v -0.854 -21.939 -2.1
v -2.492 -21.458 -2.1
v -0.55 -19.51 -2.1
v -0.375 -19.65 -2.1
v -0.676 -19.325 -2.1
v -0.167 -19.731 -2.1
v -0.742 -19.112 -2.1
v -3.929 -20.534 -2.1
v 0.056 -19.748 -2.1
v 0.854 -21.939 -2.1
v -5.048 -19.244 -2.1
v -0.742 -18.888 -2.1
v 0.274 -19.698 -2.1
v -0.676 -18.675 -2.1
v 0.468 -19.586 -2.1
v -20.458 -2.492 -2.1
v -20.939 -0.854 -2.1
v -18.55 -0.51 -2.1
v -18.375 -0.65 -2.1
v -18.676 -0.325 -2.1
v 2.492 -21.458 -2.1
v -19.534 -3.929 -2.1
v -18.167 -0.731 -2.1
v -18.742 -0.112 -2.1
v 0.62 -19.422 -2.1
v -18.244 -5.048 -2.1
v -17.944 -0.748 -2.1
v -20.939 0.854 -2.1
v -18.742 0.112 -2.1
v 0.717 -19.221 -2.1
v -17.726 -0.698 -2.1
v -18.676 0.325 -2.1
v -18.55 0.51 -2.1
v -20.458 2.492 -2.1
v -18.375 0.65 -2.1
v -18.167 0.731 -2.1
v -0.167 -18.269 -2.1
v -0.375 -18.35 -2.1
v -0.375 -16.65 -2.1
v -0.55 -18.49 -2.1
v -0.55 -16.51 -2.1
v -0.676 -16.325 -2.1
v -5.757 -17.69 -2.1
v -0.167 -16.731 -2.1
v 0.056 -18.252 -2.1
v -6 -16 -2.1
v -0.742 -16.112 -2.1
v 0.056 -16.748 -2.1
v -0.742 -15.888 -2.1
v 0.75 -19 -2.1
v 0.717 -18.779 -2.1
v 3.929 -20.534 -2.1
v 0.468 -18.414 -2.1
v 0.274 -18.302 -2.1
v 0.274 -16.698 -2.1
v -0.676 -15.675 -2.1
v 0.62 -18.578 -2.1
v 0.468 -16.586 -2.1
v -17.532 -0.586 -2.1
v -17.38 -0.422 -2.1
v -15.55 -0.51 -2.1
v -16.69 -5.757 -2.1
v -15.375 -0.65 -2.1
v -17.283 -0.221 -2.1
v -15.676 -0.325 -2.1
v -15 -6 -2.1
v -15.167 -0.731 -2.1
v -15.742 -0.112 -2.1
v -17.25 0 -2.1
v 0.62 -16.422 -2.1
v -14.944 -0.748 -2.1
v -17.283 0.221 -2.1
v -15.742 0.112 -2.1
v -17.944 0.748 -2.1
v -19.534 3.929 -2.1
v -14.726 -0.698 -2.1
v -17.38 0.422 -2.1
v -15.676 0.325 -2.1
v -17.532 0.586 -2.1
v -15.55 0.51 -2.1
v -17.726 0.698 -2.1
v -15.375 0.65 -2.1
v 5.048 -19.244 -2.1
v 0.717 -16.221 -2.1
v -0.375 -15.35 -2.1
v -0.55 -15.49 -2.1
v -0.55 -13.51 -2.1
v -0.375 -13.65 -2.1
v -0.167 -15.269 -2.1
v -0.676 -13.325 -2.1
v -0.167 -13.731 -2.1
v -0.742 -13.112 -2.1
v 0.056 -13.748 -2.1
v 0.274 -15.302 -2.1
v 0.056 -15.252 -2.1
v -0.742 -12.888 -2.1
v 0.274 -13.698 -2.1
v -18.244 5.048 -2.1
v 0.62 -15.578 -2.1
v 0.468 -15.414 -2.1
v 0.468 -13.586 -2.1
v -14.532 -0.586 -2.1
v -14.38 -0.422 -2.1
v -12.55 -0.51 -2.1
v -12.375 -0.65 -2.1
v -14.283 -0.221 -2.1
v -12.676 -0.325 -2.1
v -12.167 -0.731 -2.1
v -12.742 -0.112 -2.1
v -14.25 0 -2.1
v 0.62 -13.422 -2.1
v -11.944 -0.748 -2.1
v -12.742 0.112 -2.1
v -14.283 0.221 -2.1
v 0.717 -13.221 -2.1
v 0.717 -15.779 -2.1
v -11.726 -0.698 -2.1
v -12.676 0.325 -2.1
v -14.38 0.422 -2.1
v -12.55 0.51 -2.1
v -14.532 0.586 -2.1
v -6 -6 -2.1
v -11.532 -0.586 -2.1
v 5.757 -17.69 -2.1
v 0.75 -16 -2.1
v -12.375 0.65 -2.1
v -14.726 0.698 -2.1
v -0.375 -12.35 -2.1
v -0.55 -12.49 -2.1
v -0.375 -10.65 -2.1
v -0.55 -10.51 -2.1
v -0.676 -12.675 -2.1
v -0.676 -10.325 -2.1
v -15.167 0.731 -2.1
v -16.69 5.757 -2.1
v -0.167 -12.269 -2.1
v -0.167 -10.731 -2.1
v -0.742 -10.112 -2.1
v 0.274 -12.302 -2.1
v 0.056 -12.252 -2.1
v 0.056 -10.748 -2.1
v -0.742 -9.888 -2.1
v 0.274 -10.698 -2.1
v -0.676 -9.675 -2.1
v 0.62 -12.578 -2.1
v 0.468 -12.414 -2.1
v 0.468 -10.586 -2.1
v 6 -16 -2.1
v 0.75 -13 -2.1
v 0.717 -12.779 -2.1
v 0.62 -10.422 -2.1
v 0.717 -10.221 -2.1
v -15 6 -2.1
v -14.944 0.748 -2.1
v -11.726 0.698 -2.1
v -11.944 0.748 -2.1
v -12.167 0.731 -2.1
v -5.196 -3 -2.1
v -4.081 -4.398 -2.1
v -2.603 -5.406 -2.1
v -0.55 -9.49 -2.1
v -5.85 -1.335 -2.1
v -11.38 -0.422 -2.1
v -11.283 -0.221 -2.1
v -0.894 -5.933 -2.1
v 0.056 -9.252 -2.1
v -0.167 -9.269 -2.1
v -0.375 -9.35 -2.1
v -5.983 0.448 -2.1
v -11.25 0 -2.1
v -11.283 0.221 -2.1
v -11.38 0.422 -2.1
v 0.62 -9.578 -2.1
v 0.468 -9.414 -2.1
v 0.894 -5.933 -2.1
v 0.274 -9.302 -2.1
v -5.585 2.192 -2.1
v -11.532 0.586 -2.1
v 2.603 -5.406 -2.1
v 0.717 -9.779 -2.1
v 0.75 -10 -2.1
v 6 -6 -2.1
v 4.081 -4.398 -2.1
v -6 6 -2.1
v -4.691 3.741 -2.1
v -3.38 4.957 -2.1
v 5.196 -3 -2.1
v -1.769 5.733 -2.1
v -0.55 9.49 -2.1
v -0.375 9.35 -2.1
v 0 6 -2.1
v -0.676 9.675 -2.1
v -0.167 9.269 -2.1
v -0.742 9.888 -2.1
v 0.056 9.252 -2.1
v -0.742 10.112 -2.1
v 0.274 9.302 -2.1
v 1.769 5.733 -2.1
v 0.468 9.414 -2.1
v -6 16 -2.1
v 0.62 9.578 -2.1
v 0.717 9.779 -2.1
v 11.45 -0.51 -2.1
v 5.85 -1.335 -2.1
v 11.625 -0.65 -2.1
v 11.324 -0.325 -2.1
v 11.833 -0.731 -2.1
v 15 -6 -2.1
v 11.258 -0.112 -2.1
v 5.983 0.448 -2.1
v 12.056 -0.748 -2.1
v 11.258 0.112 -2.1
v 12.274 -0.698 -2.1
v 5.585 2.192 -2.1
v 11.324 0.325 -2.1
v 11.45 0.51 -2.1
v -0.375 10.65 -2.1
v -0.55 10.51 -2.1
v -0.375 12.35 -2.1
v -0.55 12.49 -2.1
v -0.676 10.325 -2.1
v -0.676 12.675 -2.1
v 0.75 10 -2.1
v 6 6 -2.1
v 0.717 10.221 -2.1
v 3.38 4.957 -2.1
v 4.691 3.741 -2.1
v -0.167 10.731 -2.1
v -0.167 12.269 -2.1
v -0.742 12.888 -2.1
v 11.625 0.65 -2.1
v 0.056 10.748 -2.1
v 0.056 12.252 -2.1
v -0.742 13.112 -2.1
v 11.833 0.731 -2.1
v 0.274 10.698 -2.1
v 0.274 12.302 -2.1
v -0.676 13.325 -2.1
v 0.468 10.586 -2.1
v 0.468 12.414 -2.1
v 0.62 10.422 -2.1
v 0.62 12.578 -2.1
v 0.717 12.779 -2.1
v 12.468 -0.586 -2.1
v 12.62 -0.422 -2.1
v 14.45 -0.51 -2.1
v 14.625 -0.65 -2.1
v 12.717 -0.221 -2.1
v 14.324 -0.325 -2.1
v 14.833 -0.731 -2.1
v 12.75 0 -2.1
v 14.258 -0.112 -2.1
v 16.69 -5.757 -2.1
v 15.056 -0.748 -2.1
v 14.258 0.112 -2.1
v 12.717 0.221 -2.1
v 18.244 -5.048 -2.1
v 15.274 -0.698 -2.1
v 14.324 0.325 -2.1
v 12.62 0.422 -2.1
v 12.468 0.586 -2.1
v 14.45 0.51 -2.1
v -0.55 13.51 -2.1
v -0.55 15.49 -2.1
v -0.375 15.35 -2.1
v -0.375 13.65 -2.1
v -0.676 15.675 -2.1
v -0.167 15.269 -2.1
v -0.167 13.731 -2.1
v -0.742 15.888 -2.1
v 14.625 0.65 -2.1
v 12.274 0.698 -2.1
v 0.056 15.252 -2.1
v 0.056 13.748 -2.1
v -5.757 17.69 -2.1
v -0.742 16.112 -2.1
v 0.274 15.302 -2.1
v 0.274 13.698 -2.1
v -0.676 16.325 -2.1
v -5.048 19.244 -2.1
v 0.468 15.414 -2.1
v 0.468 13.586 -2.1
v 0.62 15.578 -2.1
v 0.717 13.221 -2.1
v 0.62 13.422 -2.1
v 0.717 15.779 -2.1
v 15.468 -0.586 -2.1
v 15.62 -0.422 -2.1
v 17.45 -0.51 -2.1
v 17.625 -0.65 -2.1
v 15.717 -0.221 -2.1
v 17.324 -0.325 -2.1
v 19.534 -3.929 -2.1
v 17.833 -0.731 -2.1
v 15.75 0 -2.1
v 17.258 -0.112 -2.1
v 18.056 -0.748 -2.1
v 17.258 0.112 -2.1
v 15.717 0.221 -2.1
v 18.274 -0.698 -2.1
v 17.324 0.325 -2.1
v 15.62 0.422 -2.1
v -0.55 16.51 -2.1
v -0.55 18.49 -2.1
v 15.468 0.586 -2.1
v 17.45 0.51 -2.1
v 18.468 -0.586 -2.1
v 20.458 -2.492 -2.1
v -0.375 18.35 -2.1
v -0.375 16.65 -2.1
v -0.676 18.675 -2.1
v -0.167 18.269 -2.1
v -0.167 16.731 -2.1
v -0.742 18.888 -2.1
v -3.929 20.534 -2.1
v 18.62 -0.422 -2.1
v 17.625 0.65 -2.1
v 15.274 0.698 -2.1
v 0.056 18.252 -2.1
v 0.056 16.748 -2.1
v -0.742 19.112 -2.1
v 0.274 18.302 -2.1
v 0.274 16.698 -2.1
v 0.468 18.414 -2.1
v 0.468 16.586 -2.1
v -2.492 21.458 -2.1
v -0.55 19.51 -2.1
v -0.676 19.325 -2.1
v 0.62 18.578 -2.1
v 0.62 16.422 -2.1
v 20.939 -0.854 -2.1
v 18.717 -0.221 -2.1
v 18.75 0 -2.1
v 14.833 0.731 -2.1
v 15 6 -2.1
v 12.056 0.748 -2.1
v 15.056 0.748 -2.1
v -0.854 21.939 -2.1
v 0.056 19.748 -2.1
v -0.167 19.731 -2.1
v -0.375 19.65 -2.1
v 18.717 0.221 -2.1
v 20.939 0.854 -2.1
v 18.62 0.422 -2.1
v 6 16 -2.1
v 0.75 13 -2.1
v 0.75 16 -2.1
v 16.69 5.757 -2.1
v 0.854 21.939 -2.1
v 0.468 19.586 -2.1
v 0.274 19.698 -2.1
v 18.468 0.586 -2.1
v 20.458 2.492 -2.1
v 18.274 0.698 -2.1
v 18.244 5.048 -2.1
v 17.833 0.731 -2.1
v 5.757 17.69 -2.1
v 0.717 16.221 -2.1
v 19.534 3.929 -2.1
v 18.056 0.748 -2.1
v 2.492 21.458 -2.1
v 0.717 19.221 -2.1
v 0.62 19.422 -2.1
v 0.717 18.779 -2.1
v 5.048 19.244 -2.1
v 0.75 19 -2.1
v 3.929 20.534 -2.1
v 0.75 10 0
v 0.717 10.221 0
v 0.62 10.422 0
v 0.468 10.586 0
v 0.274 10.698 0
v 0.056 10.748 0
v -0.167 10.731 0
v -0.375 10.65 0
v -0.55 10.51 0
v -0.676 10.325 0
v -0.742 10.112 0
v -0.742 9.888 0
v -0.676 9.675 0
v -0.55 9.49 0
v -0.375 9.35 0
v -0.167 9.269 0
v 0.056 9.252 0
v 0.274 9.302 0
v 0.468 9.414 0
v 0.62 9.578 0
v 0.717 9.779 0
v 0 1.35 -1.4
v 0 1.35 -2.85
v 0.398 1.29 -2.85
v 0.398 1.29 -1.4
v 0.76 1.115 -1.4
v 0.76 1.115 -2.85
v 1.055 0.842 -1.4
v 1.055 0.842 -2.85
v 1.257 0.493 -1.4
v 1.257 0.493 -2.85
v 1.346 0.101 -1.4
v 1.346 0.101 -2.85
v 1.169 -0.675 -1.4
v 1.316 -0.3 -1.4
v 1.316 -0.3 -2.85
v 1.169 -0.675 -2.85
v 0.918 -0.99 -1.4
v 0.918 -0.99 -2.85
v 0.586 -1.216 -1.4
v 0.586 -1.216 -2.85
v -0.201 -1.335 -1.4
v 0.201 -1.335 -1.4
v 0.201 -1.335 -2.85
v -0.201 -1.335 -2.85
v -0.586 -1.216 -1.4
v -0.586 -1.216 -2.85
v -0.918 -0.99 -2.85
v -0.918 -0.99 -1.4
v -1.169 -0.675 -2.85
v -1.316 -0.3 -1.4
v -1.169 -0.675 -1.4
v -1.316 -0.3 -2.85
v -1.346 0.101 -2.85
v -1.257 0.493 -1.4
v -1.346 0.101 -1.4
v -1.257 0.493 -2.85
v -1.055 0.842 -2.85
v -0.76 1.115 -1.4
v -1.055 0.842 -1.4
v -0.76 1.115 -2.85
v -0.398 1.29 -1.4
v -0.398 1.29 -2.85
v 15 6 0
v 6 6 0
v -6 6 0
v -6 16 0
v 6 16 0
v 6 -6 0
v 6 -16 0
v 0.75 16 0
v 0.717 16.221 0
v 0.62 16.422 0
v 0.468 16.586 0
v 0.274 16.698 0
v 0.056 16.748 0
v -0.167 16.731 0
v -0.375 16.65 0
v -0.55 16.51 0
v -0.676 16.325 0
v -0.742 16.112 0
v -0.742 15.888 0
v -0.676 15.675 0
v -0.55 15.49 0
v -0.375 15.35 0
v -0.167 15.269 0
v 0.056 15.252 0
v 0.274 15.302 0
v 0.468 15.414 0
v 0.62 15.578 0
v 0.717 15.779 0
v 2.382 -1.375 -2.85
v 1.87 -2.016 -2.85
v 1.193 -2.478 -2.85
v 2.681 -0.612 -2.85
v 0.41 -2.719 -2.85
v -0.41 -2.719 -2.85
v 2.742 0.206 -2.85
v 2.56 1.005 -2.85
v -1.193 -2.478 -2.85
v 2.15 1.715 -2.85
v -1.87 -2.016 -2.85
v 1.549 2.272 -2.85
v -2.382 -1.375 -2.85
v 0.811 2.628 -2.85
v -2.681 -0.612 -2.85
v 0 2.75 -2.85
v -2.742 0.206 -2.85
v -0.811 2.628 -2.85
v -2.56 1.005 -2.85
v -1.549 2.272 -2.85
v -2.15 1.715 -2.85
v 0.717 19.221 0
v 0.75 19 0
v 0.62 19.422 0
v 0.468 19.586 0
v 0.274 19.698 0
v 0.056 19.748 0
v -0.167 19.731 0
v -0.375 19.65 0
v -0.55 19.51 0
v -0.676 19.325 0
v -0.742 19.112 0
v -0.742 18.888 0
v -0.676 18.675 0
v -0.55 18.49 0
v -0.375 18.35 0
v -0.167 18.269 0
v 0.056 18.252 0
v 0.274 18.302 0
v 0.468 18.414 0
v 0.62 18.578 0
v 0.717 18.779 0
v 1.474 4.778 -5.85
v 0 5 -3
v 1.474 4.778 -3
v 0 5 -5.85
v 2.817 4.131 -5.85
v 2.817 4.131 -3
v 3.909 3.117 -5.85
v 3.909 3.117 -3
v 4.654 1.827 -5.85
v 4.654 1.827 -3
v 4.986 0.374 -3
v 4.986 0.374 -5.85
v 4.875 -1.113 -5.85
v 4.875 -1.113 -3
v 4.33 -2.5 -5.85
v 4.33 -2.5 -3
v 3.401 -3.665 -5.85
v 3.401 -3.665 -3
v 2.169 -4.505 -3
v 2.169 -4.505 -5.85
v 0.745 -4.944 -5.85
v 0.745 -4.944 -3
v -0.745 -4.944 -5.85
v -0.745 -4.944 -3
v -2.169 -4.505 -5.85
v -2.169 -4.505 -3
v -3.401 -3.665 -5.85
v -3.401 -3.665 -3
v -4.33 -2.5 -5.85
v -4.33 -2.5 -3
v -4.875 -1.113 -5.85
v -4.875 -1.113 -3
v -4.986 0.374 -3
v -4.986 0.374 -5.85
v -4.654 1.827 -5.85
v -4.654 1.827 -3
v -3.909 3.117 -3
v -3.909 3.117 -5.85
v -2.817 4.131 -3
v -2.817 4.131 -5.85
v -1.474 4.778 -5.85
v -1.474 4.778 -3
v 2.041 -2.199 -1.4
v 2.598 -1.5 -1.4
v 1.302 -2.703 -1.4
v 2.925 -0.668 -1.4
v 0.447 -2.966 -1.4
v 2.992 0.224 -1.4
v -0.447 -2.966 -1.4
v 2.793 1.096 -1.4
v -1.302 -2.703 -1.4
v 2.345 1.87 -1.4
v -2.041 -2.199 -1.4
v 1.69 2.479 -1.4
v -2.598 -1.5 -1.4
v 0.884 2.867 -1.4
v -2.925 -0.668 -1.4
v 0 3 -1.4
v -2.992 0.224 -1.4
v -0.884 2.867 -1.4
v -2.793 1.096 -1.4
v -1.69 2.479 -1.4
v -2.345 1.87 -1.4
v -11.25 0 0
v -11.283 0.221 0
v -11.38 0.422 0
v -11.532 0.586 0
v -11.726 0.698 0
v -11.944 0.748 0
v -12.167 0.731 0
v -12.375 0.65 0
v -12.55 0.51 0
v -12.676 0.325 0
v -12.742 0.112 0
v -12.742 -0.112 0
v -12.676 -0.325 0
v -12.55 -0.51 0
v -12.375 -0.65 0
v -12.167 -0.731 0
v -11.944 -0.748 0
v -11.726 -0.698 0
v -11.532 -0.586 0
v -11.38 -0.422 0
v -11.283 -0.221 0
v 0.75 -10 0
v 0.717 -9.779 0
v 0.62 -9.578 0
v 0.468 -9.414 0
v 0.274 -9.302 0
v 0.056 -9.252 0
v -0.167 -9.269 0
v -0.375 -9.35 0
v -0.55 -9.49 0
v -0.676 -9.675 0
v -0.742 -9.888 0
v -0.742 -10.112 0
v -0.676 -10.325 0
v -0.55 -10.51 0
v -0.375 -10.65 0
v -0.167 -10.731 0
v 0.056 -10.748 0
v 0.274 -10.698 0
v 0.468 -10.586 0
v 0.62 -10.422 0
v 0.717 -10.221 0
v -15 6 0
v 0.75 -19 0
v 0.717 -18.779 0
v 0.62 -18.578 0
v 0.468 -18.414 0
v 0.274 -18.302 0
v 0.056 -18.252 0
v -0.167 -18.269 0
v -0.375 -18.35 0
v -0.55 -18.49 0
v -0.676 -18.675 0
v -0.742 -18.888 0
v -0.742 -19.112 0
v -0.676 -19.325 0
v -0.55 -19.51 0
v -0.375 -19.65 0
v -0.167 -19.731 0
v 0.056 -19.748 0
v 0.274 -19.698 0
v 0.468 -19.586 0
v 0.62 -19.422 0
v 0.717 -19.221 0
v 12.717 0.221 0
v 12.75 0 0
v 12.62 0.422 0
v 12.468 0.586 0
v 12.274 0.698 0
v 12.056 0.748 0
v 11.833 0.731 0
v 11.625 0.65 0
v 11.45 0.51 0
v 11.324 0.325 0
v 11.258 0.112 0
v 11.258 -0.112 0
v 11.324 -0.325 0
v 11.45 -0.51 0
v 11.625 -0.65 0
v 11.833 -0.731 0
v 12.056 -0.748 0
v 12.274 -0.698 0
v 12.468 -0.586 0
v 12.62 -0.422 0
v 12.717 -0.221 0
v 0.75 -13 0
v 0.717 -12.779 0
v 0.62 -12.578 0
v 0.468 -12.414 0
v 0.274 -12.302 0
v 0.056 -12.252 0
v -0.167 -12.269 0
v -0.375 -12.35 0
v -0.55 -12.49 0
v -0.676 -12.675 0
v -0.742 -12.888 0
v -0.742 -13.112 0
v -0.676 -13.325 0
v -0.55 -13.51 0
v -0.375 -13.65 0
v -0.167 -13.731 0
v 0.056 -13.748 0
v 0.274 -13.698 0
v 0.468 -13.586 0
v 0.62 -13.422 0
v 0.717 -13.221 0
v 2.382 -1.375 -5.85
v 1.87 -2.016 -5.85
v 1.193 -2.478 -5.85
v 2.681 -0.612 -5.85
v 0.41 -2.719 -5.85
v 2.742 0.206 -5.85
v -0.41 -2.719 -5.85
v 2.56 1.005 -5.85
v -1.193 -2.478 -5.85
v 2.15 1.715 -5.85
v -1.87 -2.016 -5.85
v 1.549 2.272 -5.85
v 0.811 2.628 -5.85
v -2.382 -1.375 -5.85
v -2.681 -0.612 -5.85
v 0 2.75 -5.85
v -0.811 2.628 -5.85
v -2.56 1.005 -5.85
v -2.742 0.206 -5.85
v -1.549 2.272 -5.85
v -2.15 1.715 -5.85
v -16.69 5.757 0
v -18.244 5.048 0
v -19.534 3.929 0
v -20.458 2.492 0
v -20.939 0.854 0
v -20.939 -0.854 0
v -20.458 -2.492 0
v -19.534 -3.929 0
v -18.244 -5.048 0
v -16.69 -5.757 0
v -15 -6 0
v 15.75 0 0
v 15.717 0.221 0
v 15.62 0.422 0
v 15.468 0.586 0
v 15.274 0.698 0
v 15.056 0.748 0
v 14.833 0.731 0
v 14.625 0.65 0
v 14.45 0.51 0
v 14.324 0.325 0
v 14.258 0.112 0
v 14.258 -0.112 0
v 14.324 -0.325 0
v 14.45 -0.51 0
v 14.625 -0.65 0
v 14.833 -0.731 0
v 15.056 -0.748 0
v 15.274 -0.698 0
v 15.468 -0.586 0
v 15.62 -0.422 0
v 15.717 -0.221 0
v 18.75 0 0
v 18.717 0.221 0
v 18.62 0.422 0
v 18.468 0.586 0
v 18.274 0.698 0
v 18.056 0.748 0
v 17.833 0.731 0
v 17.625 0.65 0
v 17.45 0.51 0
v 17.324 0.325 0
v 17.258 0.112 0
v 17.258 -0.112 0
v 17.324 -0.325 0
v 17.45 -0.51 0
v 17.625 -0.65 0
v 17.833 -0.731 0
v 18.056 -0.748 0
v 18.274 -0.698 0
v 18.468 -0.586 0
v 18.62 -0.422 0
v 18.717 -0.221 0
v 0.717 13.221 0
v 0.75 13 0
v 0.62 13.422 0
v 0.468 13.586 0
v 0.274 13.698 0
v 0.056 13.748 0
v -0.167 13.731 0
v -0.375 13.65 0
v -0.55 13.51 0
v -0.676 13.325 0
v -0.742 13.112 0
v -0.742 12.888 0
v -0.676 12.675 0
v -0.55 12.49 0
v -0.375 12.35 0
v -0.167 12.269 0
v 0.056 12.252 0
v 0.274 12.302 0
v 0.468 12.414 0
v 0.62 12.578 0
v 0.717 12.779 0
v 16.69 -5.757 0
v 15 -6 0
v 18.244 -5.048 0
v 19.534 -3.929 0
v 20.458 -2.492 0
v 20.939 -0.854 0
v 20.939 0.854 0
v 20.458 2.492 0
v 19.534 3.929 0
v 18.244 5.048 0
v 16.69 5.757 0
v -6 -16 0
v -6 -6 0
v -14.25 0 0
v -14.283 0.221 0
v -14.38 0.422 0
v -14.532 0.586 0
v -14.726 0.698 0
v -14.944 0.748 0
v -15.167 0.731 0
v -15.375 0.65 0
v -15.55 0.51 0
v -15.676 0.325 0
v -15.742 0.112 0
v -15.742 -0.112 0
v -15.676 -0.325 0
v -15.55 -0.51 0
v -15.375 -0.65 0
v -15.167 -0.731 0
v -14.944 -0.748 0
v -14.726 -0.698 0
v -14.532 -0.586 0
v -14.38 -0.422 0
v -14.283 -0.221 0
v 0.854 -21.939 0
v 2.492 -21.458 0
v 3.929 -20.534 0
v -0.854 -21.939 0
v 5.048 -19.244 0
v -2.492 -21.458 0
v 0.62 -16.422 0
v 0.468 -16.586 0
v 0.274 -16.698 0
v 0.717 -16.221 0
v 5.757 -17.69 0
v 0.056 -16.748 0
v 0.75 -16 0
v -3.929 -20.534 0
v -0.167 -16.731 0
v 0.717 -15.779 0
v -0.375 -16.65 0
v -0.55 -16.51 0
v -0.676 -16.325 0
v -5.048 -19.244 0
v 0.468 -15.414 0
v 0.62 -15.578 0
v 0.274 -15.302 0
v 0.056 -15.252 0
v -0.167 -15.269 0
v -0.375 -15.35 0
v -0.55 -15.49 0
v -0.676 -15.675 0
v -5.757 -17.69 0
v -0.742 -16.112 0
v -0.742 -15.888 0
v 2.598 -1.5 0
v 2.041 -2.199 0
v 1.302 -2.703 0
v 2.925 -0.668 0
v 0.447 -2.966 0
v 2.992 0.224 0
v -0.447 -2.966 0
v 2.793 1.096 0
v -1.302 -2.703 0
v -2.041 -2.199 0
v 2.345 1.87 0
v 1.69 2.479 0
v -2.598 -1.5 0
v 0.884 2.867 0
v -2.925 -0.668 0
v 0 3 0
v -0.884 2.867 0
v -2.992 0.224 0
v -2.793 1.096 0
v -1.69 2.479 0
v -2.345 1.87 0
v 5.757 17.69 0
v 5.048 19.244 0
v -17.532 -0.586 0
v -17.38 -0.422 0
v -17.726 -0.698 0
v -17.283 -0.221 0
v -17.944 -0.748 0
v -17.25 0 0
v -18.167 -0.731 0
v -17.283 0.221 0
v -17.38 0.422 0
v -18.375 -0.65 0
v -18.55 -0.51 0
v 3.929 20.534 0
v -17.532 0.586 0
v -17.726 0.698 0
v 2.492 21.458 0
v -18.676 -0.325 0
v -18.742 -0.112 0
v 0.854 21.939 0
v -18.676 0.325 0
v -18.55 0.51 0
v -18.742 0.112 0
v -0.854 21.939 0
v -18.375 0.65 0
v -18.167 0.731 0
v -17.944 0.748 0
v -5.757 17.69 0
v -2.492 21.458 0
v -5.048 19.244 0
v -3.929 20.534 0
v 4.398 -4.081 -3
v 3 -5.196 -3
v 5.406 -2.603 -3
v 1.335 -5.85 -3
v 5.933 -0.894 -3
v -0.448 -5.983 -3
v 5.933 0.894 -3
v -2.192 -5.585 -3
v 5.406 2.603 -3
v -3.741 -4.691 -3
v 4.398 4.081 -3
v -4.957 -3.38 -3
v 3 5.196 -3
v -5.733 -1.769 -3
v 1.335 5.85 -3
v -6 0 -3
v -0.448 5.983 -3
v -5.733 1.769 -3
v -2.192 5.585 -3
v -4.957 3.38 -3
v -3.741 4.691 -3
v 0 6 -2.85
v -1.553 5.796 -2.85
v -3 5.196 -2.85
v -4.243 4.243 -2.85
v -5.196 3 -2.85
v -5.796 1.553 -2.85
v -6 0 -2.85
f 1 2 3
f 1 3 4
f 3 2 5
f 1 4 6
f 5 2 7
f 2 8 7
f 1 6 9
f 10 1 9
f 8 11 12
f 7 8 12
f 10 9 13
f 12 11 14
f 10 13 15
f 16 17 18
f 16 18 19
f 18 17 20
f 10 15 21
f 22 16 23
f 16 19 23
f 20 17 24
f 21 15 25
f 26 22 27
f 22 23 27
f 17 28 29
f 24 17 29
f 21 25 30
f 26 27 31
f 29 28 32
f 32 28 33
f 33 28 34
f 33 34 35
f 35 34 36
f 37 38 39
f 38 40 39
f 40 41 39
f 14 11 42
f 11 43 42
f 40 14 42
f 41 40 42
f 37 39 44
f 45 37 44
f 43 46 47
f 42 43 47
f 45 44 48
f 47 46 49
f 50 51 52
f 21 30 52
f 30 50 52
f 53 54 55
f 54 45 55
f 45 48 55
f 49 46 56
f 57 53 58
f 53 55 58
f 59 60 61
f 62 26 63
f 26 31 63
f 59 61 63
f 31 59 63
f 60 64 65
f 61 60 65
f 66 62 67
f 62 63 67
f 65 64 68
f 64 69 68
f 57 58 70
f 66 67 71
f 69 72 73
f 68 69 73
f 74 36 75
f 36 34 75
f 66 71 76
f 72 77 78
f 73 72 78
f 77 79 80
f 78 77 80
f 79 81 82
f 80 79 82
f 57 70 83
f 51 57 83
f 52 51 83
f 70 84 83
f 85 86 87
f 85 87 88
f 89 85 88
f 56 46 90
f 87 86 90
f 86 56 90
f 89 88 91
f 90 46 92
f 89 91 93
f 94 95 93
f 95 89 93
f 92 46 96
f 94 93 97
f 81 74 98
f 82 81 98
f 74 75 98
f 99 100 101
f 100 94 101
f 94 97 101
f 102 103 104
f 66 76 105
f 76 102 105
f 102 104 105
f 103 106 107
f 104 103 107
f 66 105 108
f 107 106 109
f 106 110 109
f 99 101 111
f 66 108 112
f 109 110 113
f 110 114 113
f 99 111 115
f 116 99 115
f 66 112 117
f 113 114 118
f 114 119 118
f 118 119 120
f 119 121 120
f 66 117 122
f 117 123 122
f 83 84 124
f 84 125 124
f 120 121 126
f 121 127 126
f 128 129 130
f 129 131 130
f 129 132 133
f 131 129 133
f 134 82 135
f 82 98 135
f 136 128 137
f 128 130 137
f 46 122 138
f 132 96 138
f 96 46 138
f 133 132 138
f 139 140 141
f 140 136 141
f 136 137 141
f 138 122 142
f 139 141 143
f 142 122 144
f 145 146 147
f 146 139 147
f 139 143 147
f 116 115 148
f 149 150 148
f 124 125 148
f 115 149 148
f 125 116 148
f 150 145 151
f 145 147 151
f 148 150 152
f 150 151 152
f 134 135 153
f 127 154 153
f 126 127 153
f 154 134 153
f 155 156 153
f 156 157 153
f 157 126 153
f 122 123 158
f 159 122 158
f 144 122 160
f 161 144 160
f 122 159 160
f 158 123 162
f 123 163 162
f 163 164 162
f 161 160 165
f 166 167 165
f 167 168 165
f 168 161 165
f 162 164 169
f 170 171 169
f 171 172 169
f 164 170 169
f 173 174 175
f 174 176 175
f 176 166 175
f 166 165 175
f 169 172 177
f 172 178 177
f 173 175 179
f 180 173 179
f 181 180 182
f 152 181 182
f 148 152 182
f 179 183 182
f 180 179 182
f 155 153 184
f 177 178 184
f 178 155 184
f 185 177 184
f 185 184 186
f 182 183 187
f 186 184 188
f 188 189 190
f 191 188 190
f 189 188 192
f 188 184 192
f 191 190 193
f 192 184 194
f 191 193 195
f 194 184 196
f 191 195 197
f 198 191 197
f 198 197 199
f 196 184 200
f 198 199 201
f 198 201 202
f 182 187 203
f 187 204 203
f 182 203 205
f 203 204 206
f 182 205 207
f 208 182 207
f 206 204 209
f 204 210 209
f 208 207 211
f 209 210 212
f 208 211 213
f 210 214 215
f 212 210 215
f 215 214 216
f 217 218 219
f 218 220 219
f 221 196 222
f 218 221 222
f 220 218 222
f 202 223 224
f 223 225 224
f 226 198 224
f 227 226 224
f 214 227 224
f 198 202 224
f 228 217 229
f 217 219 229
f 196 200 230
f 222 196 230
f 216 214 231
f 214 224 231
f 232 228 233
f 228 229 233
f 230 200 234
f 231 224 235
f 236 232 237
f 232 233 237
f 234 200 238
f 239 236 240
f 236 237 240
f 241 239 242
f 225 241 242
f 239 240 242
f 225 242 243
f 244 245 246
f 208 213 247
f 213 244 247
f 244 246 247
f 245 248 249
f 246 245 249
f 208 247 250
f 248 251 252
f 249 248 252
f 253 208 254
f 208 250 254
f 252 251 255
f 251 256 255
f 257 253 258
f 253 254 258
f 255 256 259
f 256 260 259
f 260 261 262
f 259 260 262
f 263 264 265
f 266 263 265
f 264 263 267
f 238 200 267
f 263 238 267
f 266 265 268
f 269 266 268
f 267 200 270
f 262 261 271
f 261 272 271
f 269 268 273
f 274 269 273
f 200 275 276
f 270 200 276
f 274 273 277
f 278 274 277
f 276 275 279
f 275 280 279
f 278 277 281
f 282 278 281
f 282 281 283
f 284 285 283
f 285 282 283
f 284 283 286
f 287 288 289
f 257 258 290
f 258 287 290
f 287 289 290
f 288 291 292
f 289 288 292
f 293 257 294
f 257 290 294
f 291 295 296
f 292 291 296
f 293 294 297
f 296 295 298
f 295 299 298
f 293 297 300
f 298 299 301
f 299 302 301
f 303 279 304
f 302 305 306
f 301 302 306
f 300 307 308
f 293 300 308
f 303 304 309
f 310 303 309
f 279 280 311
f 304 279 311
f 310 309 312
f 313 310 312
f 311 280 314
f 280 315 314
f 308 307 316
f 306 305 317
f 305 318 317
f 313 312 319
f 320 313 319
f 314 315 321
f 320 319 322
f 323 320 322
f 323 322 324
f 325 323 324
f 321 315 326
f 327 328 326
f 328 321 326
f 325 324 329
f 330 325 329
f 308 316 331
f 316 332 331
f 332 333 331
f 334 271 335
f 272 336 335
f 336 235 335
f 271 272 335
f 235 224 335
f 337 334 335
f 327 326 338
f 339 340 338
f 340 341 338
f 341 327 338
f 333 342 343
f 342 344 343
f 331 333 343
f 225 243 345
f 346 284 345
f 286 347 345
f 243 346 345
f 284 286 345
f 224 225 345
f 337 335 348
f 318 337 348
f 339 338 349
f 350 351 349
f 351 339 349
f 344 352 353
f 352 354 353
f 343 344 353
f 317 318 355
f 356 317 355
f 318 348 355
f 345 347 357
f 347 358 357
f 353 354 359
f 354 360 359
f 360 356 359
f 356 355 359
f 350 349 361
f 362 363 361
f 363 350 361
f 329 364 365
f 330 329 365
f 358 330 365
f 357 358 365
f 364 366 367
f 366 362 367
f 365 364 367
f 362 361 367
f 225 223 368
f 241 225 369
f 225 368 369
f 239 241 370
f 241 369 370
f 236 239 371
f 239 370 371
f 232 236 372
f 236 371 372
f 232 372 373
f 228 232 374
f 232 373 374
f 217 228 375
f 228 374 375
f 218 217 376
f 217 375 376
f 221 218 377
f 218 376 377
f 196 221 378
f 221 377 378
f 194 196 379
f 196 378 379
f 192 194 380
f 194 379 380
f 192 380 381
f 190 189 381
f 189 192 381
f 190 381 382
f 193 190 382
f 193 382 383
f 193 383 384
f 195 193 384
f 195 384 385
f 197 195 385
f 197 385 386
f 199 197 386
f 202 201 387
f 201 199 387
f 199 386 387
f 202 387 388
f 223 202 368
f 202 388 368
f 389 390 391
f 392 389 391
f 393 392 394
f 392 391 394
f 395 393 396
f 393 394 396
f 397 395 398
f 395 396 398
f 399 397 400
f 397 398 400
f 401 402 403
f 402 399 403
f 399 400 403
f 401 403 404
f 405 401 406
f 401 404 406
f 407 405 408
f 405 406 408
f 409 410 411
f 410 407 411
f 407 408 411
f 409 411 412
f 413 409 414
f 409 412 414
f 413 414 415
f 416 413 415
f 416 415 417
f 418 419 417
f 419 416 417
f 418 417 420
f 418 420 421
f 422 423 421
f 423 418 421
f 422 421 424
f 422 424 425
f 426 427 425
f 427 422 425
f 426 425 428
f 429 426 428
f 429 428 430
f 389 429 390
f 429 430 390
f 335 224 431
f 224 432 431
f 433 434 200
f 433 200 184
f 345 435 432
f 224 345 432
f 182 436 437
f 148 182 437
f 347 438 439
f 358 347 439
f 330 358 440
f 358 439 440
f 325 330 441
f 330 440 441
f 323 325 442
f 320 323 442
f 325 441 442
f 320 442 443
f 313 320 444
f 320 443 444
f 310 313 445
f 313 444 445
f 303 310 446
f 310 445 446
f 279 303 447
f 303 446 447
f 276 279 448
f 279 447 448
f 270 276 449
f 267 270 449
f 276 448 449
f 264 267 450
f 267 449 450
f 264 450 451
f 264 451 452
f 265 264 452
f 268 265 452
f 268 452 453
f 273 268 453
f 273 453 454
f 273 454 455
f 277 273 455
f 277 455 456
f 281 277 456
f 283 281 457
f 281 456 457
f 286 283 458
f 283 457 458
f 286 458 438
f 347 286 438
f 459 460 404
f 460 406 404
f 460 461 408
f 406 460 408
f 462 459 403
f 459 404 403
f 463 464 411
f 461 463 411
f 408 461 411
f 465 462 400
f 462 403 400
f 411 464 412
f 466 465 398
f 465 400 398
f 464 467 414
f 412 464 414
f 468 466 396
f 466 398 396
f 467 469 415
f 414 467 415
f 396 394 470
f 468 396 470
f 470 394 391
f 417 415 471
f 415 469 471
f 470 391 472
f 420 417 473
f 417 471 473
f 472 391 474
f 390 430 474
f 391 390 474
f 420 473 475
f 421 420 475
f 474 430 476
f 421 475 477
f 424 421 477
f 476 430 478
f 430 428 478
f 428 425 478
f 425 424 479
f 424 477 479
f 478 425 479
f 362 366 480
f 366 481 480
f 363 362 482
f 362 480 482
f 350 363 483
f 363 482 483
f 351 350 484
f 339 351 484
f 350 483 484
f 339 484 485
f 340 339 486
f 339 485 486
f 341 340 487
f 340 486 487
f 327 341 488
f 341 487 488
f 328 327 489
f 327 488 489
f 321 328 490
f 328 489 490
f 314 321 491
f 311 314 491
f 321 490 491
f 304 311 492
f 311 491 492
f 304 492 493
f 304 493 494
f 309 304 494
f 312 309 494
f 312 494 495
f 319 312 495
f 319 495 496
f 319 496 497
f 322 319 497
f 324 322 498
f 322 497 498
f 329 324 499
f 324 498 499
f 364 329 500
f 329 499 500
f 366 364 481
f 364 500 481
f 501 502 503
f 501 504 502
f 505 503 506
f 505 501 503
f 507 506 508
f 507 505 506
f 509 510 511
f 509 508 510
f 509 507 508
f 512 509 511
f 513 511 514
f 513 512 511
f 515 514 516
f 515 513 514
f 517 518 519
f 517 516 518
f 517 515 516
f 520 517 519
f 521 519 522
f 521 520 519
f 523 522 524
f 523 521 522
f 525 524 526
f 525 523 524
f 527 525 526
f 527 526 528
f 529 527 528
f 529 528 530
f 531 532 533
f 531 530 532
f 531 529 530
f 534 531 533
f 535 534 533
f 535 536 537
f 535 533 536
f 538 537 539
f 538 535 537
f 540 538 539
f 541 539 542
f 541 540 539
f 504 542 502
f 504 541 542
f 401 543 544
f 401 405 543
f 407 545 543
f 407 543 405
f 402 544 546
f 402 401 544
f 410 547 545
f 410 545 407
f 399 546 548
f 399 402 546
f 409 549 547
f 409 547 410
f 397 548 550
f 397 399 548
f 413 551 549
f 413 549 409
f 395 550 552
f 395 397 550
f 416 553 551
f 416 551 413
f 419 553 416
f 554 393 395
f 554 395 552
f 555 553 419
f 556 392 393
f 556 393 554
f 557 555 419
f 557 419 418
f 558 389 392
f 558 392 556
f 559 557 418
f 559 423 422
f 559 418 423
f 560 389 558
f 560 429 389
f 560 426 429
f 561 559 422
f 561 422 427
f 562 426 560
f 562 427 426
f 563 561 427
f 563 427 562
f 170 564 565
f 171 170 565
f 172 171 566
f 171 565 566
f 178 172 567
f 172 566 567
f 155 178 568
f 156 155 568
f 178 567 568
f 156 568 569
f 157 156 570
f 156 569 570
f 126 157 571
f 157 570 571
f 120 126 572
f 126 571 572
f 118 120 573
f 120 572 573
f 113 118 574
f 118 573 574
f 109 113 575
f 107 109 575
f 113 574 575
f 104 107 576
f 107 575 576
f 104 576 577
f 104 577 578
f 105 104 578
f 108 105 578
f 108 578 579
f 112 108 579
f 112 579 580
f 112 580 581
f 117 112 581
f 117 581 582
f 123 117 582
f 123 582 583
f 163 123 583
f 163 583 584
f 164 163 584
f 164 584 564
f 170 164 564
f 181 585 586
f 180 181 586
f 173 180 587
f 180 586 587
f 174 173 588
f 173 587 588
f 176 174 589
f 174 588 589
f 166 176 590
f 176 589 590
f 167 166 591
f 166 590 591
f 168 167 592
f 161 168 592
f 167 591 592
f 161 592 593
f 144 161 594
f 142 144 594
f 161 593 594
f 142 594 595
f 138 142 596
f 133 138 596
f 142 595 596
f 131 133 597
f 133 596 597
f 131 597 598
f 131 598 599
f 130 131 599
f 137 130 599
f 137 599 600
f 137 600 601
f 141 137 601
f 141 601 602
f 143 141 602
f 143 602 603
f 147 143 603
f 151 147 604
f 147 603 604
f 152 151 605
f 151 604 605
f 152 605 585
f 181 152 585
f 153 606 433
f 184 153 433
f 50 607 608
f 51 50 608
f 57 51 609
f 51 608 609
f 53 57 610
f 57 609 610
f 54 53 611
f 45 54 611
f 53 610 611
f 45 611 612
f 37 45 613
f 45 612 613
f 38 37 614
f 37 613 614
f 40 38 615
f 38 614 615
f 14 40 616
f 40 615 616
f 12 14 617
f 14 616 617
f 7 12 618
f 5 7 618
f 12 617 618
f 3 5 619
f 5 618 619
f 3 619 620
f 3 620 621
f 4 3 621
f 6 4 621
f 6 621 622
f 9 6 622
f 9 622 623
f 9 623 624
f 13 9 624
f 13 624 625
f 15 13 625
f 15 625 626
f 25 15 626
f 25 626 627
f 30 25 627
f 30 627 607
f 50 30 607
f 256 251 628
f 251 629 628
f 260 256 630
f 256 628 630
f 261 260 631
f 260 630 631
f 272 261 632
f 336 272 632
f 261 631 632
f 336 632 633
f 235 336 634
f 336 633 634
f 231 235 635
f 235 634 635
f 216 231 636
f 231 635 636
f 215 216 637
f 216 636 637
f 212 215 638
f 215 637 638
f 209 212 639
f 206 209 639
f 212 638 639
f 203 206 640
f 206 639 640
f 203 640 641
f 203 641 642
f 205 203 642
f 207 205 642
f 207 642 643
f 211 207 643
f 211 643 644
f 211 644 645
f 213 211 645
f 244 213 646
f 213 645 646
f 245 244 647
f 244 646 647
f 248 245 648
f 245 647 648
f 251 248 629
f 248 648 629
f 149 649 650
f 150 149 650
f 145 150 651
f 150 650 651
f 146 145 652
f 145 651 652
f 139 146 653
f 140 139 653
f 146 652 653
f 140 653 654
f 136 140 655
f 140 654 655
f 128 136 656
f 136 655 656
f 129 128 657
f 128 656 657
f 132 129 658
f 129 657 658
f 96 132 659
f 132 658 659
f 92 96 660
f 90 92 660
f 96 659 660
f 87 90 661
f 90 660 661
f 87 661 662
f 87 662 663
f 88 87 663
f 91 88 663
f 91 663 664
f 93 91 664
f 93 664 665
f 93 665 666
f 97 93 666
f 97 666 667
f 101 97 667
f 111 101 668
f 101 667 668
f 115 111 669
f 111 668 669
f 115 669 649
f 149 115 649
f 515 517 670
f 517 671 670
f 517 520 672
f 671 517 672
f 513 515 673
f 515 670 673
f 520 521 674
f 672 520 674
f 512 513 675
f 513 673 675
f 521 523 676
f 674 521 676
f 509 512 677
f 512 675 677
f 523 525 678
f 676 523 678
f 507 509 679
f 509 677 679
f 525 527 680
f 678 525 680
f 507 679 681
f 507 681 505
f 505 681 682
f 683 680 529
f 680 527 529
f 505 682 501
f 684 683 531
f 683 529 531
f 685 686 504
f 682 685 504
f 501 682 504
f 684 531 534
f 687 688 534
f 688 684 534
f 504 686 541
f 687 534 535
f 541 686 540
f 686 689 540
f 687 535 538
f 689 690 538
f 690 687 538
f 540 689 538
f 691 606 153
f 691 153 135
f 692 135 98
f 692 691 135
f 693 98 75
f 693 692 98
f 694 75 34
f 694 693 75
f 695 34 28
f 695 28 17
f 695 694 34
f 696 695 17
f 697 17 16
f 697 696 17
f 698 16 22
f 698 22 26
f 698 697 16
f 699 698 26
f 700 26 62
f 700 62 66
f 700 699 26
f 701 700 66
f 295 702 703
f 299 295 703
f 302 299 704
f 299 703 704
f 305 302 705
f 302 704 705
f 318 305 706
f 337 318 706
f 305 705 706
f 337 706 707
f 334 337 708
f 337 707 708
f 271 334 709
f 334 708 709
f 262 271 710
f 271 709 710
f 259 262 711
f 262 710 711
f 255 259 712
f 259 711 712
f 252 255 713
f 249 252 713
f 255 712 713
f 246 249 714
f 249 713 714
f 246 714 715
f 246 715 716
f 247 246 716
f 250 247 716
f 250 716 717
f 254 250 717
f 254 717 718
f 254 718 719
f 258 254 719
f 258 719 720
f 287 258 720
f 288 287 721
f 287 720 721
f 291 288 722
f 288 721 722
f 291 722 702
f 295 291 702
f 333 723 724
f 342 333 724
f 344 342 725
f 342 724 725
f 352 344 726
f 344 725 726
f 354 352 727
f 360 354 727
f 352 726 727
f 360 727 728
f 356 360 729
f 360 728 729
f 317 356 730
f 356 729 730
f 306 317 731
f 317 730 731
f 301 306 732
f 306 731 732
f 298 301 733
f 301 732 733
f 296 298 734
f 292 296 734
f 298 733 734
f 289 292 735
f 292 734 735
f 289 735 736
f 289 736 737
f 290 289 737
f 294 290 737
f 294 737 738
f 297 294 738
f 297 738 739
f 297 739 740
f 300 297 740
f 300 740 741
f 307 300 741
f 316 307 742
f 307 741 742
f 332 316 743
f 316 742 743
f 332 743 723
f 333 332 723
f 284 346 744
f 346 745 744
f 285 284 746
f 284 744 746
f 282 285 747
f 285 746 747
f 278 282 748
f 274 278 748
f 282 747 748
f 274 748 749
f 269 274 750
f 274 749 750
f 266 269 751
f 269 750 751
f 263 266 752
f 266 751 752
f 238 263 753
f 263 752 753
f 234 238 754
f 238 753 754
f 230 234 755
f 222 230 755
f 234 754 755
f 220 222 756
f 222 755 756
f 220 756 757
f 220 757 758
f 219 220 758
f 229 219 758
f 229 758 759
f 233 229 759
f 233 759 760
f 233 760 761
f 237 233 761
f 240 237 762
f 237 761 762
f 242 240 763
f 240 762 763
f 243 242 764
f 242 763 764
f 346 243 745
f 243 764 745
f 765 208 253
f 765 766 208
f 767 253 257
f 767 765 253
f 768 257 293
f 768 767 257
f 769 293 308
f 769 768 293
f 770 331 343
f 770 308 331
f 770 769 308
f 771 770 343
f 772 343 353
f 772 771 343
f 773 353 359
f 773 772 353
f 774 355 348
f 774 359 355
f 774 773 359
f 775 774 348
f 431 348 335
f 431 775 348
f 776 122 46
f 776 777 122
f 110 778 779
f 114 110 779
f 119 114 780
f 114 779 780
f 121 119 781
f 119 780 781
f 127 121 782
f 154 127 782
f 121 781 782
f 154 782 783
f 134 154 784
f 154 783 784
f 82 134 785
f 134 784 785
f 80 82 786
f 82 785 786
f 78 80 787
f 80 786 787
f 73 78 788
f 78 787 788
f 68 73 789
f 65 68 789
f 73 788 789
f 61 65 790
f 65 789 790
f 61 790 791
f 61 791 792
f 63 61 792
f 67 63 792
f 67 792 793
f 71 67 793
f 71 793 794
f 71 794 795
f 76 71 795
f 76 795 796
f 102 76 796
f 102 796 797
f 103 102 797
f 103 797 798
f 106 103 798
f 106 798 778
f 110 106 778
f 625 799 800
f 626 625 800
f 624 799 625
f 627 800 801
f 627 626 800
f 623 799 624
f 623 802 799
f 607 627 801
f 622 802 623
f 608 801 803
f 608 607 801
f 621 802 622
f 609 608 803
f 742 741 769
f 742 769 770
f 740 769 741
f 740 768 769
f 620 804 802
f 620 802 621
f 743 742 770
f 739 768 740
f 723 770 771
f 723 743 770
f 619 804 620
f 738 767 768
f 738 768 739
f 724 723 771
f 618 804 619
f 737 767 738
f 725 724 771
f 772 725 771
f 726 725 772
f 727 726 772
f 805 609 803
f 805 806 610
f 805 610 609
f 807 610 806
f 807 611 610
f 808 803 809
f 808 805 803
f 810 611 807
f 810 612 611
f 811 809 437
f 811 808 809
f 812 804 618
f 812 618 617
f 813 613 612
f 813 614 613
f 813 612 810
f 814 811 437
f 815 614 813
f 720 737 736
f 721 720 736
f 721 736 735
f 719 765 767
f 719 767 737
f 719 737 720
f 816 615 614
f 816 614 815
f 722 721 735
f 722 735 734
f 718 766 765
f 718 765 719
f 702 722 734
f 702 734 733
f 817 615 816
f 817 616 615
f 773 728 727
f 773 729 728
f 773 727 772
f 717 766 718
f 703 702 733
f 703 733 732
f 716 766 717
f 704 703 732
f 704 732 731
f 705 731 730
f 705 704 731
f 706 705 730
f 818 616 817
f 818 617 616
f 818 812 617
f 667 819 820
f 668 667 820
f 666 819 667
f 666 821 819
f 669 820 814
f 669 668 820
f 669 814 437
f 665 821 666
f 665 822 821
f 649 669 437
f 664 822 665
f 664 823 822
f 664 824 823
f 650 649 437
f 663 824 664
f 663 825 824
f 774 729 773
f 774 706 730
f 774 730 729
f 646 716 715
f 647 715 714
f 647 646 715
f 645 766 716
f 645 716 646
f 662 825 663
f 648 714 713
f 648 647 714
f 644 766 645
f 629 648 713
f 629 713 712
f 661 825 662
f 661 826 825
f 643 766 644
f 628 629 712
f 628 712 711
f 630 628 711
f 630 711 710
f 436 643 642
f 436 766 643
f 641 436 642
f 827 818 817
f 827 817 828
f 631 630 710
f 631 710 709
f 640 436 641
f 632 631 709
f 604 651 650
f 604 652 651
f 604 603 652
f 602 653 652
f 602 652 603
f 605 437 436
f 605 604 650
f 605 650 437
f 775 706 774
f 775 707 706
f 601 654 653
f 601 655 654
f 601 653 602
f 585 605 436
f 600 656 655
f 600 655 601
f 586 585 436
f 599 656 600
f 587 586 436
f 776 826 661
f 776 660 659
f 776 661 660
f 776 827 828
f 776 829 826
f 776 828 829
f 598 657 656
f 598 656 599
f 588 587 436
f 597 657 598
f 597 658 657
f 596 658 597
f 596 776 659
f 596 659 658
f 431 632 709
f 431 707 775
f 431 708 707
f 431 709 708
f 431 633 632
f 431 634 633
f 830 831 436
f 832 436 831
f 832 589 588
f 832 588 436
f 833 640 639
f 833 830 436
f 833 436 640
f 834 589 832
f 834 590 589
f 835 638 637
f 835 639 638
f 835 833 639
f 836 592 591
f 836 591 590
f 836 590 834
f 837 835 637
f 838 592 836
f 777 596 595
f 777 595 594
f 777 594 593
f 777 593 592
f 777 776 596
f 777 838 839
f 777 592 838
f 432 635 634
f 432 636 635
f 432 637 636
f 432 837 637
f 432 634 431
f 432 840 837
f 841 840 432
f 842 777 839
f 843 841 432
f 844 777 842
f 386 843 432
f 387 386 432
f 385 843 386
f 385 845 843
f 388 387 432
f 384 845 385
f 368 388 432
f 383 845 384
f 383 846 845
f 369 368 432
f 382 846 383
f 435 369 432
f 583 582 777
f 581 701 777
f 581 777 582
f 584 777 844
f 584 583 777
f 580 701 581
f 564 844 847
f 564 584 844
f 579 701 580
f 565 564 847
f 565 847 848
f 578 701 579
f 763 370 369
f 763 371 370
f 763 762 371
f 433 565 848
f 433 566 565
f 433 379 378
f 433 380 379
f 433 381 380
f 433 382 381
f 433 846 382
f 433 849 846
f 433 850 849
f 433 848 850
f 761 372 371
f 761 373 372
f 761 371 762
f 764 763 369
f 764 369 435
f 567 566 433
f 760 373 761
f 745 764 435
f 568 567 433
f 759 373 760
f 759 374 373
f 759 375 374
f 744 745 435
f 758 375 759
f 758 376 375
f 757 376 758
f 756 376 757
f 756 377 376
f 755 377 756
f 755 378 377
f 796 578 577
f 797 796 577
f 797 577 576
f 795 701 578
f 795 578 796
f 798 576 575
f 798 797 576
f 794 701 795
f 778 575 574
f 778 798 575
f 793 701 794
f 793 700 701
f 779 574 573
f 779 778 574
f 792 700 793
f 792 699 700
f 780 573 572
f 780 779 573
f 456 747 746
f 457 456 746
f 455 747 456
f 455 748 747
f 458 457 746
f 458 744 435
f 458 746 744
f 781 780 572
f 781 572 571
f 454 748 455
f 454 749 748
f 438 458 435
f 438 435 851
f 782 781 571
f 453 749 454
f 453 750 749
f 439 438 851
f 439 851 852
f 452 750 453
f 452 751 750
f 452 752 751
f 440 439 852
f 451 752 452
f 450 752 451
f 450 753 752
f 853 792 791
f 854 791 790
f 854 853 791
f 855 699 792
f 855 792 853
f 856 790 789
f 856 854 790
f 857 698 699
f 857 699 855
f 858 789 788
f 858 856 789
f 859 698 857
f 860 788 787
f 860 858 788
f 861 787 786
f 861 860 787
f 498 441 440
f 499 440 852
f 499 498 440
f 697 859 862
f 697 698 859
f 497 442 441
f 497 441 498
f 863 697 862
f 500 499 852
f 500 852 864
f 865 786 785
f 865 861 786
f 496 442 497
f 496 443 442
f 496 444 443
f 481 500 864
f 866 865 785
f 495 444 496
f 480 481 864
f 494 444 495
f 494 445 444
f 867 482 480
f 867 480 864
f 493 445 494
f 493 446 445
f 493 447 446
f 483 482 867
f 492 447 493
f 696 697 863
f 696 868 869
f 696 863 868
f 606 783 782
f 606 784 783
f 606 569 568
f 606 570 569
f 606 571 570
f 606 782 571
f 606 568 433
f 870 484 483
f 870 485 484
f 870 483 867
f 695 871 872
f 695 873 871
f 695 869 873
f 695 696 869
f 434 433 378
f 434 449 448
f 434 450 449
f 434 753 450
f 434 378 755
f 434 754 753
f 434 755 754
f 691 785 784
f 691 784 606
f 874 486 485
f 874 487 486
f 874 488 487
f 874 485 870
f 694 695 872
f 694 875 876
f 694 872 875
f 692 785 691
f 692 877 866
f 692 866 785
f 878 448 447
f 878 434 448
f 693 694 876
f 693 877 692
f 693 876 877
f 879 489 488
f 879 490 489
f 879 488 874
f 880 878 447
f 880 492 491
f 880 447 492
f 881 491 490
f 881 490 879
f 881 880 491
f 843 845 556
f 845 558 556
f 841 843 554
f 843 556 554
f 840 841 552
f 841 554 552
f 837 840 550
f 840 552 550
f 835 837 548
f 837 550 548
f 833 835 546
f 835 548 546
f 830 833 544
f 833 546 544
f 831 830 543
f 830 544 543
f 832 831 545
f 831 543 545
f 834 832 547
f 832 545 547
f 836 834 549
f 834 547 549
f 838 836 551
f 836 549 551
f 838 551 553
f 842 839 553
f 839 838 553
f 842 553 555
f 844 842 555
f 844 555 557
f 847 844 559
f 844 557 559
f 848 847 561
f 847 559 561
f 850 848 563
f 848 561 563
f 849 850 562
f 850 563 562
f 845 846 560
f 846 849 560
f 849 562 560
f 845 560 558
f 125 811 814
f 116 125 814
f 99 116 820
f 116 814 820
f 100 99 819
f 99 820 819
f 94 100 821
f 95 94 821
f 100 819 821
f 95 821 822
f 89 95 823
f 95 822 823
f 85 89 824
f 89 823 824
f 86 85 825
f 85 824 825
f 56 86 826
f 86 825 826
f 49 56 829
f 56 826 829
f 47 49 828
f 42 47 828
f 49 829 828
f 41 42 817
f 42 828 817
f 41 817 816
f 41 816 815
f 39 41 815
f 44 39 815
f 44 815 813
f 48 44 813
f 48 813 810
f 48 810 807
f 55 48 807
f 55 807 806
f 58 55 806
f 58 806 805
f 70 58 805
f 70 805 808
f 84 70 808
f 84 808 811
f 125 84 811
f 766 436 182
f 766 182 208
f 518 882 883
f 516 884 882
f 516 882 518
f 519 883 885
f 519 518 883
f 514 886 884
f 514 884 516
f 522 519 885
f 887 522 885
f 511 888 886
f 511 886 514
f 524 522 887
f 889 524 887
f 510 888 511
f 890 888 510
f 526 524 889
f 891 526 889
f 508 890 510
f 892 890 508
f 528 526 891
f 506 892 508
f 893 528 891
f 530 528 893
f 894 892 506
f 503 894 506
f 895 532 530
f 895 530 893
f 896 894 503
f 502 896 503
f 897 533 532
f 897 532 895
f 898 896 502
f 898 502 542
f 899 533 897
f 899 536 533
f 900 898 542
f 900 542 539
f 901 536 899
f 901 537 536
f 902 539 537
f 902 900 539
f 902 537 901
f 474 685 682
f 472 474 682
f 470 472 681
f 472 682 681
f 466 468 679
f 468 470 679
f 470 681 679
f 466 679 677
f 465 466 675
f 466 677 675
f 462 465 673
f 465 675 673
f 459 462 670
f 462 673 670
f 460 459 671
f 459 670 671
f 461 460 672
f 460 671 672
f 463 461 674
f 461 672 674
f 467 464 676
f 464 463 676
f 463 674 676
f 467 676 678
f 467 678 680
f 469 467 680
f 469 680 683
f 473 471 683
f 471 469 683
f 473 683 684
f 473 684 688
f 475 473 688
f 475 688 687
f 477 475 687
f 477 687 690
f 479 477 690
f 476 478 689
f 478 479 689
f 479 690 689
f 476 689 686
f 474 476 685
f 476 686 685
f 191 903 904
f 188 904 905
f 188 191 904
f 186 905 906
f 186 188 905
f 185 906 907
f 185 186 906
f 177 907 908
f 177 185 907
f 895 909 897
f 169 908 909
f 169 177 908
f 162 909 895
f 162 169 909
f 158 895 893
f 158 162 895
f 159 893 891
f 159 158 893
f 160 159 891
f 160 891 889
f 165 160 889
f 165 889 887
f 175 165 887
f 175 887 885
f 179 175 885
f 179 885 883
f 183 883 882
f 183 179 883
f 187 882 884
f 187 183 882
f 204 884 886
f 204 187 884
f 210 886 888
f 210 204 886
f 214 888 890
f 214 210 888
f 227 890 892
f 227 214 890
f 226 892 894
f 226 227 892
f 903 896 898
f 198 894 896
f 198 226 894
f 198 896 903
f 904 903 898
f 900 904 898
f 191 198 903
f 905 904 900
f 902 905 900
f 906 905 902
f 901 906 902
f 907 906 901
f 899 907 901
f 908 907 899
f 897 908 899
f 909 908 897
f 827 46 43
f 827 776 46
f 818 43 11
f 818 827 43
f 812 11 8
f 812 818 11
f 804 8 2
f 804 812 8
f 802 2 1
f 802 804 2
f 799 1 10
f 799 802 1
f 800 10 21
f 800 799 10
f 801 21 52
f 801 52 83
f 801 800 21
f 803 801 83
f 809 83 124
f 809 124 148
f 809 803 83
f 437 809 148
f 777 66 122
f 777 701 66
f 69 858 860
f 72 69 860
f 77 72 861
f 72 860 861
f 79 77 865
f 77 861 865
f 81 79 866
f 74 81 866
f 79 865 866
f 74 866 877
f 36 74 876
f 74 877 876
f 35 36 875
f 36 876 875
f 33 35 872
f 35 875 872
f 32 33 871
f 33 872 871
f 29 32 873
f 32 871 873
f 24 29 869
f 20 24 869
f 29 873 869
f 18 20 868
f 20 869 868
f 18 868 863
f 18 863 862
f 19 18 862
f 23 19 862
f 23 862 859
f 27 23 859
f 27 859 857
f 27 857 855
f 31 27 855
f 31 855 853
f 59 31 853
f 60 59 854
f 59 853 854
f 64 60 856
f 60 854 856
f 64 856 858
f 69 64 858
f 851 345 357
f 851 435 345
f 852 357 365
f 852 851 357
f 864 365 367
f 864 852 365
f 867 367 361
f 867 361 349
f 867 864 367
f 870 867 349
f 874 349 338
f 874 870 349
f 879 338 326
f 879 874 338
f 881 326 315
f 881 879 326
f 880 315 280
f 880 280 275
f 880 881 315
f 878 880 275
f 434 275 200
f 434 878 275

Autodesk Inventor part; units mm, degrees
ref_plane "YZ Plane" through (0, 0, 0) normal (1, 0, 0) x (0, 1, 0)
ref_plane "XZ Plane" through (0, 0, 0) normal (0, 1, 0) x (-1, 0, 0)
ref_plane "XY Plane" through (0, 0, 0) normal (0, 0, 1) x (1, 0, 0)
sketch "Sketch1" plane through (0, 0, 0) normal (1, 0, 0) x (0, 1, 0)
  line L0 (0, 0) -> (6, 0)
  line L1 (6, 0) -> (6, -2.85)
  line L2 (6, -2.85) -> (0, -2.85)
  line L3 (0, -2.85) -> (0, 0)
  line L4 (0, 0) -> (3, 0)
  line L5 (3, 0) -> (3, -1.4)
  line L6 (3, -1.4) -> (0, -1.4)
  line L7 (0, -1.4) -> (0, 0)
  line L8 (0, -1.4) -> (1.35, -1.4)
  line L9 (1.35, -1.4) -> (1.35, -2.85)
  line L10 (1.35, -2.85) -> (0, -2.85)
  line L11 (0, -2.85) -> (0, -1.4)
  line L12 (0, -2.85) -> (5, -2.85)
  line L13 (5, -2.85) -> (5, -5.85)
  line L14 (5, -5.85) -> (0, -5.85)
  line L15 (0, -5.85) -> (0, -2.85)
  line L16 (0, -2.85) -> (2.75, -2.85)
  line L17 (2.75, -2.85) -> (2.75, -5.85)
  line L18 (2.75, -5.85) -> (0, -5.85)
  line L19 (0, -5.85) -> (0, -2.85)
  point P0 (1.5, 0)
  point P1 (1.5, -1.4)
  dimension "d0" = 6
  dimension "d1" = 2.85
  dimension "d2" = 3
  dimension "d3" = 1.4
  dimension "d4" = 1.35
  dimension "d5" = 1.45
  dimension "d6" = 5
  dimension "d7" = 3
  dimension "d8" = 2.75
  dimension "d9" = 3
revolve "Revolution1" add sketch "Sketch1" angle 360 about axis through (0, 0, -2.85) along (0, 0, 1) contours L0 L1 L2 L9 L6 L5 | L13 L14 L17 L2
sketch "Sketch2" plane through (0, 0, 0) normal (0, 0, 1) x (1, 0, 0)
  point P0 (0, 0)
sketch "Sketch3" plane through (0, 0, 0) normal (0, 0, 1) x (1, 0, 0)
  circle A0 centre (0, 16) radius 6
  circle A1 centre (-15, 0) radius 6
  circle A2 centre (0, -16) radius 6
  circle A3 centre (15, 0) radius 6
  line L0 (-6, 16) -> (-6, -16)
  line L1 (6, 16) -> (6, -16)
  line L2 (-15, 6) -> (15, 6)
  line L3 (-15, -6) -> (15, -6)
  circle A4 centre (0, 10) radius 0.75
  circle A5 centre (0, 13) radius 0.75
  circle A6 centre (0, 16) radius 0.75
  circle A7 centre (0, 19) radius 0.75
  circle A8 centre (0, -19) radius 0.75
  circle A9 centre (0, -16) radius 0.75
  circle A10 centre (0, -13) radius 0.75
  circle A11 centre (0, -10) radius 0.75
  circle A12 centre (-12, 0) radius 0.75
  circle A13 centre (-15, 0) radius 0.75
  circle A14 centre (-18, 0) radius 0.75
  circle A15 centre (12, 0) radius 0.75
  circle A16 centre (15, 0) radius 0.75
  circle A17 centre (18, 0) radius 0.75
  point P0 (0, 0)
  point P1 (-6, 6)
  point P2 (-6, -6)
  point P3 (6, -6)
  point P4 (6, 6)
  dimension "d11" = 12
  dimension "d12" = 16
  dimension "d13" = 12
  dimension "d14" = 15
  dimension "d15" = 12
  dimension "d16" = 16
  dimension "d17" = 12
  dimension "d18" = 15
  dimension "d19" = 1.5
  dimension "d20" = 1.5
  dimension "d21" = 1.5
  dimension "d22" = 1.5
  dimension "d23" = 10
  dimension "d24" = 13
  dimension "d25" = 16
  dimension "d26" = 19
  dimension "d27" = 1.5
  dimension "d28" = 1.5
  dimension "d29" = 1.5
  dimension "d30" = 1.5
  dimension "d31" = 10
  dimension "d32" = 13
  dimension "d33" = 16
  dimension "d34" = 19
  dimension "d35" = 1.5
  dimension "d36" = 1.5
  dimension "d37" = 1.5
  dimension "d38" = 12
  dimension "d39" = 15
  dimension "d40" = 18
  dimension "d41" = 1.5
  dimension "d42" = 1.5
  dimension "d43" = 1.5
  dimension "d44" = 18
  dimension "d45" = 15
  dimension "d46" = 12
extrude "Extrusion1" add sketch "Sketch3" against normal blind 2.1 contours A0 A4 | L1 L2 L0 A0 A4 | L2 A3 L3 L1 | L1 L3 L0 L2 | L0 L3 A1 L2 | L1 A2 A11 L0 L3 | A3 | A1 | A2 A11 picked at (-2.215, 14.0731) picked at (-2.215, -14.0731)
revolve "Revolution2" cut sketch "Sketch1" angle 360 about axis through (0, 0, -2.85) along (0, 0, 1) contours L0 L5 L6 L3 | L6 L9 L2 L3 | L2 L17 L14 L15
sketch "Sketch4" plane through (0, 0, -2.85) normal (0, 0, -1) x (-1, 0, 0)
  circle A0 centre (0, 0) radius 6
  circle A1 centre (0, 0) radius 1.35 projected
  circle A2 centre (0, 0) radius 5
extrude "Extrusion2" add sketch "Sketch4" along normal blind 0.15 contours A0
properties part number "Standar Servo Horn - Red"
